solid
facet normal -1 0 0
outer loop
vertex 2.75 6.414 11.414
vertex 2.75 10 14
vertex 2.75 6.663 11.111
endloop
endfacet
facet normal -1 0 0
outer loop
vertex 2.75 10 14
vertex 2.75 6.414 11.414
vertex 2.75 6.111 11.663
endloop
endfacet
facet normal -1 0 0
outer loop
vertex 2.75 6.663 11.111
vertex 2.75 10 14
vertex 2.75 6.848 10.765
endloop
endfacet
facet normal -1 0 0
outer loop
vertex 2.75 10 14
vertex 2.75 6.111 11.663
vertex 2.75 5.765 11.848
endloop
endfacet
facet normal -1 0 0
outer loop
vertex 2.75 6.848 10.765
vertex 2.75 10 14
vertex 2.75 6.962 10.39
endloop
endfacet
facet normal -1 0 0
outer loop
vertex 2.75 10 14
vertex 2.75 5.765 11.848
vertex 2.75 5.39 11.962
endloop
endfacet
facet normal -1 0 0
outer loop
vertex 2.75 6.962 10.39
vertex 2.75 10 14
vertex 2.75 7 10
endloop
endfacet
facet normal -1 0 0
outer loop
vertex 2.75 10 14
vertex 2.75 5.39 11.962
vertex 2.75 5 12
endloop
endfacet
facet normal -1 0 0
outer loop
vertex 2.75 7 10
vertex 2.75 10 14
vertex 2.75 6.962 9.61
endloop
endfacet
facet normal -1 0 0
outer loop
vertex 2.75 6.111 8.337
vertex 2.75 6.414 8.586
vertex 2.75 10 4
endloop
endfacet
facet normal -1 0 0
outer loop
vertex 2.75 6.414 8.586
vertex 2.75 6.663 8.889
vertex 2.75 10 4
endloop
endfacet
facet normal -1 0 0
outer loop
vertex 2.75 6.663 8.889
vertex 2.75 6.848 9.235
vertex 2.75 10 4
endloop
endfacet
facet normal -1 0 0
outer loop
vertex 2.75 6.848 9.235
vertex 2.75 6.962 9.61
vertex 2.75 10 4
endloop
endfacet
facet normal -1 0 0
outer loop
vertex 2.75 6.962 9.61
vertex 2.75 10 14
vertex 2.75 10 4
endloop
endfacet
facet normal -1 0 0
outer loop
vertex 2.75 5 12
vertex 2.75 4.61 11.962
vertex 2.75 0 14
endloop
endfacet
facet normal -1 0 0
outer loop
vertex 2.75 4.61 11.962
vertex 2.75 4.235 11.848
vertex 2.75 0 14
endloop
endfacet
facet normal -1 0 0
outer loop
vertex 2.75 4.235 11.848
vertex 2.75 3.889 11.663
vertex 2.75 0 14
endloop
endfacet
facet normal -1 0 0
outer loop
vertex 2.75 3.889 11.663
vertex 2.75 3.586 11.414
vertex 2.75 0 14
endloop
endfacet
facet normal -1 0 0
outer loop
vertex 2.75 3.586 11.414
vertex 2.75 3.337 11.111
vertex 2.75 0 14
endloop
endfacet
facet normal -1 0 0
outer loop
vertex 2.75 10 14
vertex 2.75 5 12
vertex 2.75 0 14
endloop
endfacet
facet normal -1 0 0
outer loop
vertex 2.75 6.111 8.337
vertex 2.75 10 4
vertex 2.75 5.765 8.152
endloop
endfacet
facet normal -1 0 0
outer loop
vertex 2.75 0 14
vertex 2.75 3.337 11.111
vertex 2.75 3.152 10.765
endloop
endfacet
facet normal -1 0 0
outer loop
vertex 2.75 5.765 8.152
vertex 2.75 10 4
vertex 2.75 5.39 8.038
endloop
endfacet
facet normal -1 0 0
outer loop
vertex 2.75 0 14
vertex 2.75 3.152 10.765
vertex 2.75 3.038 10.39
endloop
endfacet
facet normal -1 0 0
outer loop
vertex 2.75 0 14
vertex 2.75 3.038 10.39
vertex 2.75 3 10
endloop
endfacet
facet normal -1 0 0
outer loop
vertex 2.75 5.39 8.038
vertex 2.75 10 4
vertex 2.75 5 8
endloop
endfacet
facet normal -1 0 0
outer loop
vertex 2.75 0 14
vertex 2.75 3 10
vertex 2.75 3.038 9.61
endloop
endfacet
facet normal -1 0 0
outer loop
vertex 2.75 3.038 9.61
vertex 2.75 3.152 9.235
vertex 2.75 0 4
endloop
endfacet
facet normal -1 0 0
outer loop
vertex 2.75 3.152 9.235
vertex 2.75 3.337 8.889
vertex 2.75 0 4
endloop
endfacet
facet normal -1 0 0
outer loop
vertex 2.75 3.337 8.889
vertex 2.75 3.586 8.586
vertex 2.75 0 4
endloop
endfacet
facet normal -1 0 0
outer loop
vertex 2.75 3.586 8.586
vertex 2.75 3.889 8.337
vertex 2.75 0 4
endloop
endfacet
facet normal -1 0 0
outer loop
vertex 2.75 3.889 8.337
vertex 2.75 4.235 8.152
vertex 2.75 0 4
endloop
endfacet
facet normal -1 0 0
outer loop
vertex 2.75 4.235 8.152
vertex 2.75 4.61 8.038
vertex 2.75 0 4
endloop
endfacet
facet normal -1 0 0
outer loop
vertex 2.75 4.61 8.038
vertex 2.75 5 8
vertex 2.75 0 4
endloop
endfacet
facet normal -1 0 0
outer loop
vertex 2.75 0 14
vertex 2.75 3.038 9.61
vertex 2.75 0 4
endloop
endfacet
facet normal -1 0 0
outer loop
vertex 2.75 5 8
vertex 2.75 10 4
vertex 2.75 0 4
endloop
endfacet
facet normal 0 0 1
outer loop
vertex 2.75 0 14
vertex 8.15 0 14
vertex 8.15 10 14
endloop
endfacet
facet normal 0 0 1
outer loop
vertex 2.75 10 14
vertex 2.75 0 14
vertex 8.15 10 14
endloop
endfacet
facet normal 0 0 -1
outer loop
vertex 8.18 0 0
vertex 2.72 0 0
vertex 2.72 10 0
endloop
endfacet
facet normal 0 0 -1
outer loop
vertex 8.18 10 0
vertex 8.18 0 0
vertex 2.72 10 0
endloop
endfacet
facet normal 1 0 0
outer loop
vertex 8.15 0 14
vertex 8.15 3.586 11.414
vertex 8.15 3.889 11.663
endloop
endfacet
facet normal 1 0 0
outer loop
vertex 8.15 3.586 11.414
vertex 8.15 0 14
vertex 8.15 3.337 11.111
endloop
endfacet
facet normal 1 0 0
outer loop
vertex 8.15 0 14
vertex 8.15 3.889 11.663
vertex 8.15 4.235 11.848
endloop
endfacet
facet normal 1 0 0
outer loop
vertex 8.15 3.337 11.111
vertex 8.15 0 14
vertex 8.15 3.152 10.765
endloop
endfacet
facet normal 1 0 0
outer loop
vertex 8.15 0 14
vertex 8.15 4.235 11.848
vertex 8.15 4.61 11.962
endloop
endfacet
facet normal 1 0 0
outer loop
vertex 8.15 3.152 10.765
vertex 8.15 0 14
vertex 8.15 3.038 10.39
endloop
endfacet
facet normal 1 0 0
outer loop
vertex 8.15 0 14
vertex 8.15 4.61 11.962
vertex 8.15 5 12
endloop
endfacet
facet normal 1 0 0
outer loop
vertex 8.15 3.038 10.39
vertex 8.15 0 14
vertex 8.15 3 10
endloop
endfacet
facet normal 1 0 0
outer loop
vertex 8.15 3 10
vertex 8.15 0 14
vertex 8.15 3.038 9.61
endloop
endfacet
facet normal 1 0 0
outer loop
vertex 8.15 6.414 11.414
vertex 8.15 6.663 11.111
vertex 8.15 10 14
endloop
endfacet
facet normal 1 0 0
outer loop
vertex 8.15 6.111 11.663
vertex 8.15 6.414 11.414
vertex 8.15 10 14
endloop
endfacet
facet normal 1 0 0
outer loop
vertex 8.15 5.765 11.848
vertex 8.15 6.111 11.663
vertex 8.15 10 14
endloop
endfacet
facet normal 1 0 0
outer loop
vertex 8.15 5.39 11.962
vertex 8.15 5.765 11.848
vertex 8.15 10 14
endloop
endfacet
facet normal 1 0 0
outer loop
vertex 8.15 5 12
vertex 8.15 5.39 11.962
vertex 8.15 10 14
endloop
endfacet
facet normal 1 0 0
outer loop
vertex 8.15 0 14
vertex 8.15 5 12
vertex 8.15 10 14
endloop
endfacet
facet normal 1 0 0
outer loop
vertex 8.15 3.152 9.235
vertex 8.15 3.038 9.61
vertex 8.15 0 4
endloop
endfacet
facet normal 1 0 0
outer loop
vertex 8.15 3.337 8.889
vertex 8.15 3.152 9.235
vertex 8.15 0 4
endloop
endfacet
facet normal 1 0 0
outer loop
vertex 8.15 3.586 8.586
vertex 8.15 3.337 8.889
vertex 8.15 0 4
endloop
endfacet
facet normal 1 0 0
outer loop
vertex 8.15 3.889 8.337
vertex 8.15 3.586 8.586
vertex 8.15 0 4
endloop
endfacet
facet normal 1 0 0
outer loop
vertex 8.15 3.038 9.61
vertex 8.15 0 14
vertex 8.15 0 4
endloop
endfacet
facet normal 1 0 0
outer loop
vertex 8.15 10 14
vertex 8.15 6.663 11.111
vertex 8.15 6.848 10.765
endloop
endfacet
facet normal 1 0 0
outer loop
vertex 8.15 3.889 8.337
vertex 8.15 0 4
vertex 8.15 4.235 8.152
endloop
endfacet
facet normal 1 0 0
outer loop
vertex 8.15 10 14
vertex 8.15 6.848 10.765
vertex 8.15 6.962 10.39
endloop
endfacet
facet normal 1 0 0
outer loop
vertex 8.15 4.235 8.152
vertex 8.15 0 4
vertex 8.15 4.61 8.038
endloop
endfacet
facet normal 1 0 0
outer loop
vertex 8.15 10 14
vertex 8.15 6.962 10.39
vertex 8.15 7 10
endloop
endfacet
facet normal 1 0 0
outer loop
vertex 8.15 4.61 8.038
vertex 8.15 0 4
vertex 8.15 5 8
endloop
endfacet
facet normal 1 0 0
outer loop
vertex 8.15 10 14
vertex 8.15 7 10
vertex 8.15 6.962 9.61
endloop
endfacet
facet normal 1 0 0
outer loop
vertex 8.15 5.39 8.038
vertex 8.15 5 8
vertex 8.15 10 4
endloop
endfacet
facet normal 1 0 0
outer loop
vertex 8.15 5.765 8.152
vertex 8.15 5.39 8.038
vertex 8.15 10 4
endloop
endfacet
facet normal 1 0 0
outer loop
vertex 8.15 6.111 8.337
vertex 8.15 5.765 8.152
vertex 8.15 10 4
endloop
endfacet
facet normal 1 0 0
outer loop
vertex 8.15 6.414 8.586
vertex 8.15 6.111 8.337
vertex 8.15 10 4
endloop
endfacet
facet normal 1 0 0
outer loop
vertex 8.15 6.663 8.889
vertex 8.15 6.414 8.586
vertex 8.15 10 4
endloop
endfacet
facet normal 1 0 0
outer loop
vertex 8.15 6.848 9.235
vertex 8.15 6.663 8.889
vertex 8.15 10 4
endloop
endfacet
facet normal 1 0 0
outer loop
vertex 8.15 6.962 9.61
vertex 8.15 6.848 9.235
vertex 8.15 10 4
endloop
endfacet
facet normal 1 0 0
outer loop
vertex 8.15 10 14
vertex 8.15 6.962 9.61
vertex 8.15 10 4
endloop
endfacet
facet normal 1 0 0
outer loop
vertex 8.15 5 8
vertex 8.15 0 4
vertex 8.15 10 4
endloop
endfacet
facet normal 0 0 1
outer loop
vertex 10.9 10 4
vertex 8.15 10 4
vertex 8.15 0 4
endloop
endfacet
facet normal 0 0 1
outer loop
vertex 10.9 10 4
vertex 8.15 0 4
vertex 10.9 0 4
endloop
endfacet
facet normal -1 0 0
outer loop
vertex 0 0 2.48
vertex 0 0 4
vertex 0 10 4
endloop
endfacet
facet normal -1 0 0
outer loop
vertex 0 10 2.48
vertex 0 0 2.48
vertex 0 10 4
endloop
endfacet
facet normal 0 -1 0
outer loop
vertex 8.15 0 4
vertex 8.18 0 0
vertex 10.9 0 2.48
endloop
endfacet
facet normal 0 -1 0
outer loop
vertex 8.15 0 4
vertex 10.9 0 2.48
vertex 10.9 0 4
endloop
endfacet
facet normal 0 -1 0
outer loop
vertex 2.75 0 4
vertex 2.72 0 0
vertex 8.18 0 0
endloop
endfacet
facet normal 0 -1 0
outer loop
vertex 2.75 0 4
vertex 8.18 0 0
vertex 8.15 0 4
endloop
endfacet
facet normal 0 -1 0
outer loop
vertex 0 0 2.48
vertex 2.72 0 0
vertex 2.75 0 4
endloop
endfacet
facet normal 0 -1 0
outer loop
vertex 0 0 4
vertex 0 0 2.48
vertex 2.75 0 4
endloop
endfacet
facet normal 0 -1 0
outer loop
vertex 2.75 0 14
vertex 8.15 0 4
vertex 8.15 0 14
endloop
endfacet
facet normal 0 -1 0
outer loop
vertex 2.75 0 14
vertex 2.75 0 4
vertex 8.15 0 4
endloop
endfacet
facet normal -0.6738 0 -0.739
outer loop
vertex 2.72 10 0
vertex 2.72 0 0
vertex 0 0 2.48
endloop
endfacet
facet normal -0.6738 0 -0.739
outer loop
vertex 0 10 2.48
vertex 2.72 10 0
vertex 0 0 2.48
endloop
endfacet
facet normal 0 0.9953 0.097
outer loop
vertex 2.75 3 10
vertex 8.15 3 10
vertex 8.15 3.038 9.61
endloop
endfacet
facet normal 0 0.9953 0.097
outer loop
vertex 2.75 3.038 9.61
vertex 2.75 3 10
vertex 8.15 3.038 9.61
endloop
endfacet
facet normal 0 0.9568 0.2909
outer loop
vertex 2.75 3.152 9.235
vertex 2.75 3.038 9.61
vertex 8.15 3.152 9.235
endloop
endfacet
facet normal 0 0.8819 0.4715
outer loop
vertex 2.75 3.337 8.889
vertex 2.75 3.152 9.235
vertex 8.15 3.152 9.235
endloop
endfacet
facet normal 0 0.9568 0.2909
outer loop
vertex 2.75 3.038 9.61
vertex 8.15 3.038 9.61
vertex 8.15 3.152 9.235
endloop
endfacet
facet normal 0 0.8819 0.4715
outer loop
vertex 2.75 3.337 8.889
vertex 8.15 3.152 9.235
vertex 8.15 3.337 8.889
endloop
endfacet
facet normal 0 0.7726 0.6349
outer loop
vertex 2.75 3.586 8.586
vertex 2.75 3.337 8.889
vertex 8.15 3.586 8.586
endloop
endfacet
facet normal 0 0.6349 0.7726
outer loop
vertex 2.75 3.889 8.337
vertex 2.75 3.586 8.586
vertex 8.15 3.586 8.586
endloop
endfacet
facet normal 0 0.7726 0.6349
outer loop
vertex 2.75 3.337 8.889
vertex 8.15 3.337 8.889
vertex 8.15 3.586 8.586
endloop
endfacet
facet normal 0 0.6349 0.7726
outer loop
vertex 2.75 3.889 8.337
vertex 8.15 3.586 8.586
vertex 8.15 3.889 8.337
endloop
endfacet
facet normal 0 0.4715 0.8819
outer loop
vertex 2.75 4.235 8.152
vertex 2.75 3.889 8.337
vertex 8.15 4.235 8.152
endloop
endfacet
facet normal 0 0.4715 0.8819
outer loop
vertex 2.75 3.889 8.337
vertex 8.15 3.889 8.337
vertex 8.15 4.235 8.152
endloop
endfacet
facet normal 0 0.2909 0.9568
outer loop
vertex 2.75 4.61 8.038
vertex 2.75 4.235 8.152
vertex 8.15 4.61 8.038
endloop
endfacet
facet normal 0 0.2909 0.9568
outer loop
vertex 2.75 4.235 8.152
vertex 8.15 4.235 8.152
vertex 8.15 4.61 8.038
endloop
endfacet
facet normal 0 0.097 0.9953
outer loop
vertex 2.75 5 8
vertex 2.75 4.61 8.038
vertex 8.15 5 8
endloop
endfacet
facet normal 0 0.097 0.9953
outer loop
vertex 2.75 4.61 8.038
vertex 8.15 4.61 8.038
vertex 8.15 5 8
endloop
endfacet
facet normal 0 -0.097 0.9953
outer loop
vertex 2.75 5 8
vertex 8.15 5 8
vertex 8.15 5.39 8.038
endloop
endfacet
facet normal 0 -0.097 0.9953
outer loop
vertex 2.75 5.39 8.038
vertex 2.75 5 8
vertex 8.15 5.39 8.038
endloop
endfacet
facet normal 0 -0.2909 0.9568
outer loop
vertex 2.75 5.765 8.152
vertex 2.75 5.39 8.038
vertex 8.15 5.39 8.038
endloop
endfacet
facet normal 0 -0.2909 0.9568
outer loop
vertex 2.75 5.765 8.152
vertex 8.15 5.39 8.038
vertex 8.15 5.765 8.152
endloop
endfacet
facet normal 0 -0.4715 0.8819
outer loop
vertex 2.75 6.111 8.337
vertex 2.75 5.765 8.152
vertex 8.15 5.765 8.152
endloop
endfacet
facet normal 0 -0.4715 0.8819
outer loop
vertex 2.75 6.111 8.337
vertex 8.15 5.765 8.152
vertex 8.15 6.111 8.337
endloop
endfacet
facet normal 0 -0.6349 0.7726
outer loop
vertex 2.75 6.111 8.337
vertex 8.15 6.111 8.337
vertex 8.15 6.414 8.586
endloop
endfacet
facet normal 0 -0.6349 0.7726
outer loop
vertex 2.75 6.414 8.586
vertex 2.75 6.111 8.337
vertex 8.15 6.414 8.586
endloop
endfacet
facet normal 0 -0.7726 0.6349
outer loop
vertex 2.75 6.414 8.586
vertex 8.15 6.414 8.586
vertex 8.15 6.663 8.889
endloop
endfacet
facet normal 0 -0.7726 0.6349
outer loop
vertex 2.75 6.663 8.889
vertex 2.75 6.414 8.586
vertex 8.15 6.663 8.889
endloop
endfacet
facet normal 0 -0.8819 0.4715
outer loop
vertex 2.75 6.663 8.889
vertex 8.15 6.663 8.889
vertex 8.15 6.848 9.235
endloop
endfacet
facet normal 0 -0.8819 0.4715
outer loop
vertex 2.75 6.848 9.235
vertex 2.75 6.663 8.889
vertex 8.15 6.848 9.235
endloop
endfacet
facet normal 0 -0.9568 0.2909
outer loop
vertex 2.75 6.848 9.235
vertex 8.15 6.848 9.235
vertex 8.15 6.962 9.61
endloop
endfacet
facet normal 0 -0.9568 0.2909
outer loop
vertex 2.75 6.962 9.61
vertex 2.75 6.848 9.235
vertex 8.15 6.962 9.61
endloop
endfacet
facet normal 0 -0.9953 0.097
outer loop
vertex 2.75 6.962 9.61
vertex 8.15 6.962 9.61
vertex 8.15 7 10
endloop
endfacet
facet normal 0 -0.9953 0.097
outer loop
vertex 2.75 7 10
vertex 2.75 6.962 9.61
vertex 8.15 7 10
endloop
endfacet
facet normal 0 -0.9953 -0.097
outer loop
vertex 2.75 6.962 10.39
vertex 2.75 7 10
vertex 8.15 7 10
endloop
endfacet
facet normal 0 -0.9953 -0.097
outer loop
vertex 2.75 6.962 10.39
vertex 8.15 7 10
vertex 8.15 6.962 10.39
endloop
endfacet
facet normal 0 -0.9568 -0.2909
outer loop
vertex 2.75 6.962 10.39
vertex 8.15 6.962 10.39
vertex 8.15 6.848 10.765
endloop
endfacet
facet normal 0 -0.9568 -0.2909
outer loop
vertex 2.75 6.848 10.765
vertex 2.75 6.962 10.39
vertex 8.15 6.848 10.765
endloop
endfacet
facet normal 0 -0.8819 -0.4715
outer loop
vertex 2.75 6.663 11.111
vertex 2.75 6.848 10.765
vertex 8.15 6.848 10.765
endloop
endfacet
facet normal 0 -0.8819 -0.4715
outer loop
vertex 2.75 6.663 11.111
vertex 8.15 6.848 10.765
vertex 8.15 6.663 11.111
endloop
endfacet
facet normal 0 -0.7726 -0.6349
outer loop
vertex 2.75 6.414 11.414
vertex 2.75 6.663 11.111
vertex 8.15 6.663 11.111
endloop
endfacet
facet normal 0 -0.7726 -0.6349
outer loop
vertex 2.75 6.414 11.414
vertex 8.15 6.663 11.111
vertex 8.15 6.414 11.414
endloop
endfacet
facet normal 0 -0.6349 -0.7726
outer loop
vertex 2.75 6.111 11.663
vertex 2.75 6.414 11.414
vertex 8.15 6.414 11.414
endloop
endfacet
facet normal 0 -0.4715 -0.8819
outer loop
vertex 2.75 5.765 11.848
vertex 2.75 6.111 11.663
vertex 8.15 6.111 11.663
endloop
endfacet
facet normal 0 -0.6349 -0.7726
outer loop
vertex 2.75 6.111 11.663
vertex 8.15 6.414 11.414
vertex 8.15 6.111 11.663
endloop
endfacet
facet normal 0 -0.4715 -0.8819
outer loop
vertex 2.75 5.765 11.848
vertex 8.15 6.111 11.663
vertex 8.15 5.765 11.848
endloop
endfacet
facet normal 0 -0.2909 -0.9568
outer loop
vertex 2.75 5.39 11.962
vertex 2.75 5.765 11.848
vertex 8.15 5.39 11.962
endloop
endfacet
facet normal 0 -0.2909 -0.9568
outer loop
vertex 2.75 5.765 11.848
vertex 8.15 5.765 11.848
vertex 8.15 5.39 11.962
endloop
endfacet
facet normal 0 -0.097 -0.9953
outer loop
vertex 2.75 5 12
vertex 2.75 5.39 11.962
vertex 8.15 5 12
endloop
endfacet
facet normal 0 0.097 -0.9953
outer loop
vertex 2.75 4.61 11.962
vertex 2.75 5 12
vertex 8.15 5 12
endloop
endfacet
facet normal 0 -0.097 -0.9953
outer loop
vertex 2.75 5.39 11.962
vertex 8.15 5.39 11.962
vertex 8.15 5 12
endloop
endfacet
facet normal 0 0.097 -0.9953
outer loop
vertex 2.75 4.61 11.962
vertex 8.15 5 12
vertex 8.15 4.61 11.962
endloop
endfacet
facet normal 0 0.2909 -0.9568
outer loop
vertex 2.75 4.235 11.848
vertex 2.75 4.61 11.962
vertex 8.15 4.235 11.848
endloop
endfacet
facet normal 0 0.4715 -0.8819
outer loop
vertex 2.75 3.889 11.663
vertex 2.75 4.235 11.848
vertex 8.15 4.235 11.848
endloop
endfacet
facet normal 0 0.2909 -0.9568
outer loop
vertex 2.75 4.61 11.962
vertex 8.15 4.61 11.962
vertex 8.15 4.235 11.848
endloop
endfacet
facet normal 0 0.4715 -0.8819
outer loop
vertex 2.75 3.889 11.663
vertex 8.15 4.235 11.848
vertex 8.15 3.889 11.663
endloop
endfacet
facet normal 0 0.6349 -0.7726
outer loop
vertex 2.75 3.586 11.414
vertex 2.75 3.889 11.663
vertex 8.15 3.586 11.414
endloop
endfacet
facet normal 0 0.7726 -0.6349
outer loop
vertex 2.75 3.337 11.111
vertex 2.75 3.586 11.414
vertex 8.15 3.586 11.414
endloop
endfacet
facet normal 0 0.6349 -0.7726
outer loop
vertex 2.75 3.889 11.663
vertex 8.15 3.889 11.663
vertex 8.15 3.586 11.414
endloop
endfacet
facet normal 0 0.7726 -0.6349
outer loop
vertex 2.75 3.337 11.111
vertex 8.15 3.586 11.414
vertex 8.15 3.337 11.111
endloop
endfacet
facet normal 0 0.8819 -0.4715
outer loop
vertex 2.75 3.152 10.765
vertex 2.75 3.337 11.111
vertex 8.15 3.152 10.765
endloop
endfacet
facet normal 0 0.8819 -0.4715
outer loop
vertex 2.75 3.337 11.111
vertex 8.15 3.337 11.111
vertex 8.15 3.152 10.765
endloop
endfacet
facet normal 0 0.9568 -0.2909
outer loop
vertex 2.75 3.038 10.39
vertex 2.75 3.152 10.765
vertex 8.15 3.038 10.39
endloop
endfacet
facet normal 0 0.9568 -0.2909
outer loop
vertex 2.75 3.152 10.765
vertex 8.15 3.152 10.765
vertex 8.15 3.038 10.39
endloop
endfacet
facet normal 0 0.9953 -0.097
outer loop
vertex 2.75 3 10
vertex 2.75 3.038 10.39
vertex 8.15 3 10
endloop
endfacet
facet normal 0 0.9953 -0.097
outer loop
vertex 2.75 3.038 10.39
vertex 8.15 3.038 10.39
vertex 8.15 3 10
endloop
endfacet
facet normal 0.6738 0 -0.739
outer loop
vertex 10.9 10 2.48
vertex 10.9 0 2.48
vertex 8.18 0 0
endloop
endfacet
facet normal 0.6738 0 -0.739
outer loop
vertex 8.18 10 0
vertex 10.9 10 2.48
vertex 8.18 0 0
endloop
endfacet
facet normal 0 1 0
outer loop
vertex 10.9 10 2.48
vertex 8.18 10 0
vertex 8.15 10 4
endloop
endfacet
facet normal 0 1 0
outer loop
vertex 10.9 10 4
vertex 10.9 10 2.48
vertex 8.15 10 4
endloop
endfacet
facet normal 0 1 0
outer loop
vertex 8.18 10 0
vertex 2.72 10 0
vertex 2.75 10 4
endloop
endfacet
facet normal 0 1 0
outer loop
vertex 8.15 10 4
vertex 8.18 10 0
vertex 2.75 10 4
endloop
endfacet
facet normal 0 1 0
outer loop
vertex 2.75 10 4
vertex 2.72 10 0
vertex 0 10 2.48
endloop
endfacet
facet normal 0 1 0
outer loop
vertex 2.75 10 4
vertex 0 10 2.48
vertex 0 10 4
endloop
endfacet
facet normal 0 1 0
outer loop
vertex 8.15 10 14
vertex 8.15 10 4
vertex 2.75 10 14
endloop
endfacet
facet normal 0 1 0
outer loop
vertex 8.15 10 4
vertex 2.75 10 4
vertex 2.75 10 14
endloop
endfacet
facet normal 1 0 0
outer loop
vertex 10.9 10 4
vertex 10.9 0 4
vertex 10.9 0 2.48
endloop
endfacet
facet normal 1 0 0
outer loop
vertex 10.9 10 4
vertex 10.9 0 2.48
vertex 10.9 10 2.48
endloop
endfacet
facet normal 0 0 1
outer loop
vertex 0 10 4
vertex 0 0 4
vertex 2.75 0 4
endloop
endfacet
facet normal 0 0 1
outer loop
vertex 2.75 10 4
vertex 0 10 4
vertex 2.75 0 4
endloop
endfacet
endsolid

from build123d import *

# Parameters (mm, degrees)
F0_W     = 10
F0_H     = 6.09
F1_DEPTH = 10.9
F2_W     = 10.9
F2_H     = 2.09
F3_DEPTH = 25
F5_DEPTH = 12
F6_W     = 10
F6_H     = 2
F7_DEPTH = 25


with BuildPart() as f1:
    # F0 (on Right) → F1 (new body)
    with BuildSketch(Plane.YZ):
        with Locations((5, 3.045)):
            Rectangle(F0_W, F0_H)
    extrude(amount=F1_DEPTH)

    # F2 (on face) → F3 (cut)
    with BuildSketch(Plane.XZ):
        with Locations((5.45, 5.045)):
            Rectangle(F2_W, F2_H)
        Polygon((0, 0), (2.72, 0), (0, 2.48), align=None)
        Polygon((8.18, 0), (10.9, 0), (10.9, 2.48), align=None)
    extrude(amount=-F3_DEPTH, mode=Mode.SUBTRACT)

    # F4 (on face) → F5 (join)
    with BuildSketch(Plane.XY.offset(4)):
        Polygon((8.15, 10), (5.45, 10), (2.75, 10), (2.75, 0), (8.15, 0), align=None)
    extrude(amount=F5_DEPTH)

    # F6 (on face) → F7 (cut)
    with BuildSketch(Plane.YZ.offset(8.15)):
        with BuildLine():
            Line((3, 10), (7, 10))
            ThreePointArc((7, 10), (5, 12), (3, 10))
        make_face()
        with BuildLine():
            ThreePointArc((3, 10), (5, 8), (7, 10))
            Line((7, 10), (3, 10))
        make_face()
        with Locations((5, 15)):
            Rectangle(F6_W, F6_H)
    extrude(amount=-F7_DEPTH, mode=Mode.SUBTRACT)


solid = f1.part
